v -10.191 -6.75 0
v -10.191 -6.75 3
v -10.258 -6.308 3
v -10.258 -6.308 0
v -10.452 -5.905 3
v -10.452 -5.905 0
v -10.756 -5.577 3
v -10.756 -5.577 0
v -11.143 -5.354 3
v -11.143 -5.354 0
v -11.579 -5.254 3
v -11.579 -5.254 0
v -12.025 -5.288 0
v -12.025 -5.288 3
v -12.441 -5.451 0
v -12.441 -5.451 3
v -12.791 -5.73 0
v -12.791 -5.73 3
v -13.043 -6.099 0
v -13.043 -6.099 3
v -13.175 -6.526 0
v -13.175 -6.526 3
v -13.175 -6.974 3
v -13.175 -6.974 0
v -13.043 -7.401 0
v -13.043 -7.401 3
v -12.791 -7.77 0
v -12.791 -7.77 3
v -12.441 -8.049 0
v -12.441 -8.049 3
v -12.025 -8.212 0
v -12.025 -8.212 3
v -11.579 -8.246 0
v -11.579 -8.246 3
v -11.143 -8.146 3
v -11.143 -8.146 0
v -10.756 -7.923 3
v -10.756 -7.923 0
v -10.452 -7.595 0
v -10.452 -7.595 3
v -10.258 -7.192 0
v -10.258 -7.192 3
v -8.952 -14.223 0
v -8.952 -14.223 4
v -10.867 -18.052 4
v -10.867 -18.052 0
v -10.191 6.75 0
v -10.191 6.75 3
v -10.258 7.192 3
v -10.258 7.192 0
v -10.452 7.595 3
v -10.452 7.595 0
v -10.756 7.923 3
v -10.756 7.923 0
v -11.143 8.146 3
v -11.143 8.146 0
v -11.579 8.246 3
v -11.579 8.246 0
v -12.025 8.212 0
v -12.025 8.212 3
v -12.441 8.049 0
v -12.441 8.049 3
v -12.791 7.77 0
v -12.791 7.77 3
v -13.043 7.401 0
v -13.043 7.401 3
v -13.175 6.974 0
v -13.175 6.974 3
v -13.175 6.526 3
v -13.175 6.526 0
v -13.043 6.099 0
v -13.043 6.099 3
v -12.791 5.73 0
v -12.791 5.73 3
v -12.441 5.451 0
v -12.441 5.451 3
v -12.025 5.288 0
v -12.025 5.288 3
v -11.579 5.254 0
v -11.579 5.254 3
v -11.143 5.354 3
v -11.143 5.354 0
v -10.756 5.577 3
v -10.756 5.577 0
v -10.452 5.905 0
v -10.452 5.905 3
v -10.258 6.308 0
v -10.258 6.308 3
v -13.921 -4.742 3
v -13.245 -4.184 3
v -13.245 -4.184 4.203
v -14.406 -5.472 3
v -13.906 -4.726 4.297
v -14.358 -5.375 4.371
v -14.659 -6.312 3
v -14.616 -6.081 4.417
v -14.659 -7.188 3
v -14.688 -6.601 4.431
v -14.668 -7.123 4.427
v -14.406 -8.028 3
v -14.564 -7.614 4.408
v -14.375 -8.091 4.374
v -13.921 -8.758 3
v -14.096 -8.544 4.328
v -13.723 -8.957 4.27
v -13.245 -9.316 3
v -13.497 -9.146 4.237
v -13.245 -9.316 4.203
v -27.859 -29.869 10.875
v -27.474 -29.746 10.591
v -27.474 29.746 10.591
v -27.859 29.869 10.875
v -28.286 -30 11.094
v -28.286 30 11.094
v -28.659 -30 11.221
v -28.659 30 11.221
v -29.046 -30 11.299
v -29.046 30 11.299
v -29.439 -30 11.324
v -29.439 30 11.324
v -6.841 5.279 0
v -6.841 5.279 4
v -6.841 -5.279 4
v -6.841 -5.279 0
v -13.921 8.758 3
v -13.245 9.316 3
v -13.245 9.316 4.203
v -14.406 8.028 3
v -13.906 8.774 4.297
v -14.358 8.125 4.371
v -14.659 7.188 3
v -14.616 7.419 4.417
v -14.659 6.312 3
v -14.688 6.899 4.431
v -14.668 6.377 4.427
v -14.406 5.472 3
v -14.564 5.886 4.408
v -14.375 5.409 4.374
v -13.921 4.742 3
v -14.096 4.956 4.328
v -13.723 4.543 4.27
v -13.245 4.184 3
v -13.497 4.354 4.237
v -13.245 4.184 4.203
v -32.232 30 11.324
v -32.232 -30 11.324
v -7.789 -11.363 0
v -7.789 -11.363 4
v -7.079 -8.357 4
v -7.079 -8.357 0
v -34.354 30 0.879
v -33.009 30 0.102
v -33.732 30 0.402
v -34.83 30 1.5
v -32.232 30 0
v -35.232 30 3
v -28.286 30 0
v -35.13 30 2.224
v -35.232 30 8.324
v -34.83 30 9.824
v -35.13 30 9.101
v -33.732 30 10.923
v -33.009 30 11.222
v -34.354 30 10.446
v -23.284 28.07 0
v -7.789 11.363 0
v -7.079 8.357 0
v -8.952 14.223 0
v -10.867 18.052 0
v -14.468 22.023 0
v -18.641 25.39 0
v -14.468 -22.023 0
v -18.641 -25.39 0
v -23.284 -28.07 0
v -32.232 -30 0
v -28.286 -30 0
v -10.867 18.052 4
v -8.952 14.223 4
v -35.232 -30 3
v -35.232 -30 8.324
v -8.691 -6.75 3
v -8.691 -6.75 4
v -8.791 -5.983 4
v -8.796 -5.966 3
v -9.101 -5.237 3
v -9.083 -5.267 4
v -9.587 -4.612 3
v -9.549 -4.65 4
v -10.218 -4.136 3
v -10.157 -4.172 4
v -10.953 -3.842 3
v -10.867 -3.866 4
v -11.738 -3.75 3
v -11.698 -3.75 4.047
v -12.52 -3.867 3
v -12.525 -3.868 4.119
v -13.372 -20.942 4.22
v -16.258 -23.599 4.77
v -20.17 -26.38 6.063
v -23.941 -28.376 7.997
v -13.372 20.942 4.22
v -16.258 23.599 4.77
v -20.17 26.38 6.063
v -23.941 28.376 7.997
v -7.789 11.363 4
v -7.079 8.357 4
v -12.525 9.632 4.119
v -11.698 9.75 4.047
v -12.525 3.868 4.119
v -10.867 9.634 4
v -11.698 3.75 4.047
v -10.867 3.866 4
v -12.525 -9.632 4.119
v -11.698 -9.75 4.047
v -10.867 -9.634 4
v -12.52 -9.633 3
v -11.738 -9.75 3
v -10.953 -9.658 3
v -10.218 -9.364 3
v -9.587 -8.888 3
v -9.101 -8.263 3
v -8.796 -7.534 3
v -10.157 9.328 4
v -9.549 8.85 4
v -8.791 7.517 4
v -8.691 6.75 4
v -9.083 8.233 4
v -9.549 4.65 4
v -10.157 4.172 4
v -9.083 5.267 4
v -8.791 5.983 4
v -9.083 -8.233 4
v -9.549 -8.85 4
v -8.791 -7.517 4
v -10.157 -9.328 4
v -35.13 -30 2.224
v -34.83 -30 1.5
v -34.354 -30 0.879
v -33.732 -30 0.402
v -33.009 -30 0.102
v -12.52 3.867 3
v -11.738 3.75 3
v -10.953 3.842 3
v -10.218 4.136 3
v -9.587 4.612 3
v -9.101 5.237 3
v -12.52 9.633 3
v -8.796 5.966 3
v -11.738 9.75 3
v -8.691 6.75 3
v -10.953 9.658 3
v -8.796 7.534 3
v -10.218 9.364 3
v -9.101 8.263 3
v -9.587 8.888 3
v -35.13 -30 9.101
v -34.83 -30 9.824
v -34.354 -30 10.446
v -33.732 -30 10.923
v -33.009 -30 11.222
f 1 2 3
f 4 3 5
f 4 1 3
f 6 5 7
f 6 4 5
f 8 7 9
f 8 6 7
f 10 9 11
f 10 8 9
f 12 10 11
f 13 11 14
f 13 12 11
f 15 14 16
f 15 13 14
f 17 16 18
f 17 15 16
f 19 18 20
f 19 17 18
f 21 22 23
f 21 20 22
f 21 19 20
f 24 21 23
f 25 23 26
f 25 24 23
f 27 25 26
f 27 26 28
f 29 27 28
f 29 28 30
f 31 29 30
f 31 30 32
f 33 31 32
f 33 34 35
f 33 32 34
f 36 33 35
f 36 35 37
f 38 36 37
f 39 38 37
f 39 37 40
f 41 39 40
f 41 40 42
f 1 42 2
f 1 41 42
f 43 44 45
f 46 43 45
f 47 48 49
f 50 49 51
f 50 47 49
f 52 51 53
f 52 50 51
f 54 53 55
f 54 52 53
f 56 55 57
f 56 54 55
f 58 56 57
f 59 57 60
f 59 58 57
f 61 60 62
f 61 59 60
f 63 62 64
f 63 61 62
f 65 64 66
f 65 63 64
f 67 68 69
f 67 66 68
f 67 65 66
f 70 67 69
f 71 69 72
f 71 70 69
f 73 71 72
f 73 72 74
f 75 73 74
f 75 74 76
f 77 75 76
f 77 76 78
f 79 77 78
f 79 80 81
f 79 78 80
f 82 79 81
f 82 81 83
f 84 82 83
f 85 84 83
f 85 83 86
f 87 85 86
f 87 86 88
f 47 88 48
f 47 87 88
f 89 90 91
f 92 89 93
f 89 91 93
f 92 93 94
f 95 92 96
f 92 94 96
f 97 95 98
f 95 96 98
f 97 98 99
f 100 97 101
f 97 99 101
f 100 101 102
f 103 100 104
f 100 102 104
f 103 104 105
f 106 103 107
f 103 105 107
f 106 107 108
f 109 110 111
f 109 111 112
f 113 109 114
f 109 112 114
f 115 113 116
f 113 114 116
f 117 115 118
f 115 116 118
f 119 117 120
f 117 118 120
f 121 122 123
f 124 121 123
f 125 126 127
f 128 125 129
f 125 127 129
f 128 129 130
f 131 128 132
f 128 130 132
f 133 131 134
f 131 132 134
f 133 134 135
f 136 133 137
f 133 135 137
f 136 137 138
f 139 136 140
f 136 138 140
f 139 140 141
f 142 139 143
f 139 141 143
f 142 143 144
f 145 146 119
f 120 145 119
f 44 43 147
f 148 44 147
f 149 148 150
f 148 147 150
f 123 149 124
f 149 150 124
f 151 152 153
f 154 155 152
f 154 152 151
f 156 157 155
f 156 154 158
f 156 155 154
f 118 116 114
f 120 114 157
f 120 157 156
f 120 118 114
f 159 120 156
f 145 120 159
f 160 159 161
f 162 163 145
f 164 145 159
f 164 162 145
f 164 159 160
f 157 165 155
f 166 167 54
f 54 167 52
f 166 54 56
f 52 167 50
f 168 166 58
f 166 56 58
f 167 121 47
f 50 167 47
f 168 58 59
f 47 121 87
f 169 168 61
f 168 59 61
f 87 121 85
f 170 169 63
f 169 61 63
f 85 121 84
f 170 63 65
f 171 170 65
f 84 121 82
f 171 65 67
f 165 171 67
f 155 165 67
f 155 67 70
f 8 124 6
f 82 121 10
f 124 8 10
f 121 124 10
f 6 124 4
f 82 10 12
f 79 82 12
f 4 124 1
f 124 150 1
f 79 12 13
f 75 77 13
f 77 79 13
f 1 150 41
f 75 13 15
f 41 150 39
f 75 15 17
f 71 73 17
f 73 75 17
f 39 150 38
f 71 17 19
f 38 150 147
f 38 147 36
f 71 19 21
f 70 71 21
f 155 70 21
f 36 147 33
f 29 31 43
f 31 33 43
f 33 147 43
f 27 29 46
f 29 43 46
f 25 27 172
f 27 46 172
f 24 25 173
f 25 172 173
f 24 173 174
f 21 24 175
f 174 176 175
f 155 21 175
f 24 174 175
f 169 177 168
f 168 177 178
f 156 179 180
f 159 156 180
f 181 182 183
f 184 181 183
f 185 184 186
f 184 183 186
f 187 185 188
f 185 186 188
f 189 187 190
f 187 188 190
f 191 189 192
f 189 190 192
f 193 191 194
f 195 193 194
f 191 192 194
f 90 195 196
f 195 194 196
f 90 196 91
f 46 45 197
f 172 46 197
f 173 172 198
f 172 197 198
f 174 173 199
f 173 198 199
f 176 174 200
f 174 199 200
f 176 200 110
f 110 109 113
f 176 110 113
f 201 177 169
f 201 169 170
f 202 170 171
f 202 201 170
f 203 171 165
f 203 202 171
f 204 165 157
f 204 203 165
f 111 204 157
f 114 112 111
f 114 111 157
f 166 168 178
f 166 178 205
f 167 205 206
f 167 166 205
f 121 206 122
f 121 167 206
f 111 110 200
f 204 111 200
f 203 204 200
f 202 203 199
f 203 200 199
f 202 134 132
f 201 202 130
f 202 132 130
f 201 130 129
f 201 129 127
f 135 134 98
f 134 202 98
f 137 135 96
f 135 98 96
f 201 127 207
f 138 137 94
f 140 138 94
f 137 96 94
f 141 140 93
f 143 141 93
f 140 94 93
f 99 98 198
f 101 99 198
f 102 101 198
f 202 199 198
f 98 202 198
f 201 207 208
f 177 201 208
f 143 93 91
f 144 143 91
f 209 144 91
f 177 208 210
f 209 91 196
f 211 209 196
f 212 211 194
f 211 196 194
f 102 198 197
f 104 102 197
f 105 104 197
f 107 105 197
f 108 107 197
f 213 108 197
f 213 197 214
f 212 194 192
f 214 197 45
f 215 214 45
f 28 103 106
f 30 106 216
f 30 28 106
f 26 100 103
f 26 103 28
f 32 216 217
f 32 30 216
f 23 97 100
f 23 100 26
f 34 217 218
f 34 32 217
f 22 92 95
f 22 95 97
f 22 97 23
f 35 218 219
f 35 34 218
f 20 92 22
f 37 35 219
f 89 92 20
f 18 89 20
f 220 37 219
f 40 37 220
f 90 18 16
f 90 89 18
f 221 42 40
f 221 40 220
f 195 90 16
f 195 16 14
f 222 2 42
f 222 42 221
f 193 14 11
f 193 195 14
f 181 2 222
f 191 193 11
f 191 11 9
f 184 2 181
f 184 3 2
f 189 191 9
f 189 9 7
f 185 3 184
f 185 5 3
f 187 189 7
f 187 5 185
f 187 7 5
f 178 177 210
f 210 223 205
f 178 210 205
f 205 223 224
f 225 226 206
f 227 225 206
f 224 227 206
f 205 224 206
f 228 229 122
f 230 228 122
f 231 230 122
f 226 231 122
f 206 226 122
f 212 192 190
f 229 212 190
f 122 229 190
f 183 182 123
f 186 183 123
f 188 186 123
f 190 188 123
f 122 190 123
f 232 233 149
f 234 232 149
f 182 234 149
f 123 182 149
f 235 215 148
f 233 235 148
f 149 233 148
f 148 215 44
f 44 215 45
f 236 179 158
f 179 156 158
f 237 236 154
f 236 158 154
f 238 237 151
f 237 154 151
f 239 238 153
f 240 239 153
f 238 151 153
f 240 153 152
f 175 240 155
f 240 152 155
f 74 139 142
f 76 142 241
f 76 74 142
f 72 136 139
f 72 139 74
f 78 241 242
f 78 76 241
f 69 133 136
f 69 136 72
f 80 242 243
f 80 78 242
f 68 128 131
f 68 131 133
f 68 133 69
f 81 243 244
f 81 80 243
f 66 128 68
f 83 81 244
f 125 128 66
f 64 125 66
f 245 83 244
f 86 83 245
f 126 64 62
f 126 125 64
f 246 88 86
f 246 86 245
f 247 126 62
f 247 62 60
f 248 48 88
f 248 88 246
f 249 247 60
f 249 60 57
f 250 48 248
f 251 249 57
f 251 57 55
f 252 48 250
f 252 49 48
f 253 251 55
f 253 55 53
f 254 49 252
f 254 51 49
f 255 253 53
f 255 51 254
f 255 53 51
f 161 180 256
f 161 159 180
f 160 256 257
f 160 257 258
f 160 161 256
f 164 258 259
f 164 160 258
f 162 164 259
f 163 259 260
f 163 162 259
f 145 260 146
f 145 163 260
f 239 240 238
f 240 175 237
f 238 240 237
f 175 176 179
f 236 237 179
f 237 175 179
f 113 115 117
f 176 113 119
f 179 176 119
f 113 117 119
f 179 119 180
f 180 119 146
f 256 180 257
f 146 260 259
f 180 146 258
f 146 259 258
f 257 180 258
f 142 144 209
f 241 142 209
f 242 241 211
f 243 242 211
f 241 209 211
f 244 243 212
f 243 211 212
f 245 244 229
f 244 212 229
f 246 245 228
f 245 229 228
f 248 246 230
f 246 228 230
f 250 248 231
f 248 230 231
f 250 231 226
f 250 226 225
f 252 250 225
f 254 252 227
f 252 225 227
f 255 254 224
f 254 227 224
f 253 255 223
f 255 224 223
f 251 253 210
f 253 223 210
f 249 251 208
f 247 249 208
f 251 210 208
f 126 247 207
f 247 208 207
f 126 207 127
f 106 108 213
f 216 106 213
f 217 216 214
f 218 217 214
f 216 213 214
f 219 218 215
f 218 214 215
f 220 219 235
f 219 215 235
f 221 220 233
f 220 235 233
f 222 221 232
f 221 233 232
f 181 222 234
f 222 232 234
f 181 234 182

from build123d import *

# Parameters (mm, degrees)
SKETCH_1_W          = 35.317292642
SKETCH_1_H          = 60
SKETCH_1_R          = 1.5
EXTRUDE_1_DEPTH     = 8
SKETCH_2_R          = 3
CUT_EXTRUDE_1_DEPTH = 3
EXTRUDE_2_DEPTH     = 60
FILLET_1_R          = 3
SKETCH_4_R          = 5
CUT_EXTRUDE_2_DEPTH = 47.960729747
CUT_EXTRUDE_3_DEPTH = 10
FILLET_2_R          = 20
CUT_EXTRUDE_4_DEPTH = 71.495063746
CUT_EXTRUDE_5_DEPTH = 2
CUT_EXTRUDE_6_DEPTH = 48.639836404
CUT_EXTRUDE_7_DEPTH = 71.495063746
FILLET_4_R          = 3


with BuildPart() as part:
    # 草图1 → 凸台-拉伸1 (new body)
    with BuildSketch(Plane.XY):
        Rectangle(SKETCH_1_W, SKETCH_1_H)
        with Locations((0, 13.5)):
            Circle(SKETCH_1_R, mode=Mode.SUBTRACT)
        with Locations((11.691342951, 6.75)):
            Circle(SKETCH_1_R, mode=Mode.SUBTRACT)
        with Locations((11.691342951, -6.75)):
            Circle(SKETCH_1_R, mode=Mode.SUBTRACT)
        with Locations((0, -13.5)):
            Circle(SKETCH_1_R, mode=Mode.SUBTRACT)
        with Locations((-11.691342951, -6.75)):
            Circle(SKETCH_1_R, mode=Mode.SUBTRACT)
        with Locations((-11.691342951, 6.75)):
            Circle(SKETCH_1_R, mode=Mode.SUBTRACT)
    extrude(amount=EXTRUDE_1_DEPTH)

    # 草图2 → 切除-拉伸1 (cut)
    with BuildSketch(Plane.XY.offset(8)):
        with Locations((0, 13.5)):
            Circle(SKETCH_2_R)
        with Locations((11.691342951, 6.75)):
            Circle(SKETCH_2_R)
        with Locations((11.691342951, -6.75)):
            Circle(SKETCH_2_R)
        with Locations((0, -13.5)):
            Circle(SKETCH_2_R)
        with Locations((-11.691342951, -6.75)):
            Circle(SKETCH_2_R)
        with Locations((-11.691342951, 6.75)):
            Circle(SKETCH_2_R)
    extrude(amount=-CUT_EXTRUDE_1_DEPTH, mode=Mode.SUBTRACT)

    # 草图3 → 凸台-拉伸2 (add)
    with BuildSketch(Plane.XZ.offset(30)):
        Polygon((-23.303511793, 11.324481191), (-17.658646321, 8), (-17.658646321, 0), (-35.232231527, 0), (-35.232231527, 11.324481191), align=None)
    extrude(amount=-EXTRUDE_2_DEPTH)

    # 圆角1
    fillet_1_edges = [part.edges().sort_by_distance(p)[0] for p in [
        (-17.658646321, 0, 8),
        (-35.232231527, 0, 11.324481191),
        (17.658646321, -30, 4),
        (-35.232231527, 0, 0),
        (-23.303511793, 0, 11.324481191),
        (17.658646321, 30, 4),
    ]]
    fillet(fillet_1_edges, radius=FILLET_1_R)

    # 草图4 → 切除-拉伸2 (cut, through all)
    with BuildSketch(Plane.XY.offset(8)):
        Circle(SKETCH_4_R)
    extrude(amount=-CUT_EXTRUDE_2_DEPTH, mode=Mode.SUBTRACT)

    # 草图5 → 切除-拉伸3 (cut)
    with BuildSketch(Plane.XY.offset(8)):
        with BuildLine():
            ThreePointArc((14.658646321, -30), (16.779966665, -29.121320344), (17.658646321, -27))
            Line((17.658646321, -27), (17.658646321, 27))
            ThreePointArc((17.658646321, 27), (16.779966665, 29.121320344), (14.658646321, 30))
            Line((14.658646321, 30), (-16.840879336, 30))
            Line((-16.840879336, 30), (-6.840879336, 10))
            Line((-6.840879336, 10), (-6.840879336, 0))
            Line((-6.840879336, 0), (-6.840879336, -10))
            Line((-6.840879336, -10), (-16.840879336, -30))
            Line((-16.840879336, -30), (14.658646321, -30))
        make_face()
    extrude(amount=-CUT_EXTRUDE_3_DEPTH, mode=Mode.SUBTRACT)

    # 圆角2
    fillet_2_edges = [part.edges().sort_by_distance(p)[0] for p in [
        (-6.840879336, -10, 4),
        (-6.840879336, 10, 4),
    ]]
    fillet(fillet_2_edges, radius=FILLET_2_R)

    # 草图6 → 切除-拉伸4 (cut, through all)
    with BuildSketch(Plane.XZ.offset(30)):
        with BuildLine():
            Line((-18.363290882, 8.414992633), (-16.840879336, 7.518385164))
            Line((-16.840879336, 7.518385164), (-16.840879336, 8))
            ThreePointArc((-16.840879336, 8), (-17.629859025, 8.105606963), (-18.363290882, 8.414992633))
        make_face()
        Polygon((-16.840879336, 8), (-16.840879336, 7.518385164), (-10.866770961, 4), (-6.840879336, 4), (-6.840879336, 8), (-8.952335516, 8), align=None)
        with BuildLine():
            Line((-28.285671321, 11.324481191), (-16.840879336, 6.512055498))
            Line((-16.840879336, 6.512055498), (-16.840879336, 7.518385164))
            Line((-16.840879336, 7.518385164), (-18.363290882, 8.414992633))
            Line((-18.363290882, 8.414992633), (-22.598867233, 10.909488557))
            ThreePointArc((-22.598867233, 10.909488557), (-23.332299089, 11.218874227), (-24.121278778, 11.324481191))
            Line((-24.121278778, 11.324481191), (-28.285671321, 11.324481191))
        make_face()
        Polygon((-16.840879336, 7.518385164), (-16.840879336, 6.512055498), (-10.866770961, 4), align=None)
    extrude(amount=-CUT_EXTRUDE_4_DEPTH, mode=Mode.SUBTRACT)

    # 草图7 → 切除-拉伸5 (cut)
    with BuildSketch(Plane.XY.offset(5)):
        with BuildLine():
            ThreePointArc((-13.244946275, 9.316382028), (-14.691342951, 6.75), (-13.244946275, 4.183617972))
            Line((-13.244946275, 4.183617972), (-13.244946275, 9.316382028))
        make_face()
        with BuildLine():
            Line((-13.244946275, 9.316382028), (-13.244946275, 4.183617972))
            ThreePointArc((-13.244946275, 4.183617972), (-10.218388433, 4.13649565), (-8.691342951, 6.75))
            ThreePointArc((-8.691342951, 6.75), (-10.218388433, 9.36350435), (-13.244946275, 9.316382028))
        make_face()
        with BuildLine():
            Line((-13.244946275, -9.316382028), (-13.244946275, -4.183617972))
            ThreePointArc((-13.244946275, -4.183617972), (-14.691342951, -6.75), (-13.244946275, -9.316382028))
        make_face()
        with BuildLine():
            ThreePointArc((-13.244946275, -4.183617972), (-14.691342951, -6.75), (-13.244946275, -9.316382028))
            Line((-13.244946275, -9.316382028), (-13.244946275, -4.183617972))
        make_face()
        with BuildLine():
            Line((-13.244946275, -4.183617972), (-13.244946275, -9.316382028))
            ThreePointArc((-13.244946275, -9.316382028), (-10.218388433, -9.36350435), (-8.691342951, -6.75))
            ThreePointArc((-8.691342951, -6.75), (-10.218388433, -4.13649565), (-13.244946275, -4.183617972))
        make_face()
    extrude(amount=-CUT_EXTRUDE_5_DEPTH, mode=Mode.SUBTRACT)

    # 草图8 → 切除-拉伸6 (cut, through all)
    with BuildSketch(Plane.XY.offset(11.324481191)):
        with BuildLine():
            ThreePointArc((-10.866770961, 18.051783249), (-18.640704436, 25.389749731), (-28.285671321, 30))
            Line((-28.285671321, 30), (-16.840879336, 30))
            Line((-16.840879336, 30), (-10.866770961, 18.051783249))
        make_face()
        with BuildLine():
            Line((-16.840879336, -30), (-10.866770961, -18.051783249))
            ThreePointArc((-10.866770961, -18.051783249), (-18.640704436, -25.389749731), (-28.285671321, -30))
            Line((-28.285671321, -30), (-16.840879336, -30))
        make_face()
    extrude(amount=-CUT_EXTRUDE_6_DEPTH, mode=Mode.SUBTRACT)

    # 草图10 → 切除-拉伸7 (cut, through all)
    with BuildSketch(Plane.XZ.offset(30)):
        with BuildLine():
            Line((-10.866770961, 4), (-28.285671321, 11.324481191))
            ThreePointArc((-28.285671321, 11.324481191), (-20.236995628, 6.090803021), (-10.866770961, 4))
        make_face()
    extrude(amount=-CUT_EXTRUDE_7_DEPTH, mode=Mode.SUBTRACT)

    # 圆角4
    fillet_4_edges = [part.edges().sort_by_distance(p)[0] for p in [
        (-28.285671321, 0, 11.324481191),
    ]]
    fillet(fillet_4_edges, radius=FILLET_4_R)


solid = part.part
